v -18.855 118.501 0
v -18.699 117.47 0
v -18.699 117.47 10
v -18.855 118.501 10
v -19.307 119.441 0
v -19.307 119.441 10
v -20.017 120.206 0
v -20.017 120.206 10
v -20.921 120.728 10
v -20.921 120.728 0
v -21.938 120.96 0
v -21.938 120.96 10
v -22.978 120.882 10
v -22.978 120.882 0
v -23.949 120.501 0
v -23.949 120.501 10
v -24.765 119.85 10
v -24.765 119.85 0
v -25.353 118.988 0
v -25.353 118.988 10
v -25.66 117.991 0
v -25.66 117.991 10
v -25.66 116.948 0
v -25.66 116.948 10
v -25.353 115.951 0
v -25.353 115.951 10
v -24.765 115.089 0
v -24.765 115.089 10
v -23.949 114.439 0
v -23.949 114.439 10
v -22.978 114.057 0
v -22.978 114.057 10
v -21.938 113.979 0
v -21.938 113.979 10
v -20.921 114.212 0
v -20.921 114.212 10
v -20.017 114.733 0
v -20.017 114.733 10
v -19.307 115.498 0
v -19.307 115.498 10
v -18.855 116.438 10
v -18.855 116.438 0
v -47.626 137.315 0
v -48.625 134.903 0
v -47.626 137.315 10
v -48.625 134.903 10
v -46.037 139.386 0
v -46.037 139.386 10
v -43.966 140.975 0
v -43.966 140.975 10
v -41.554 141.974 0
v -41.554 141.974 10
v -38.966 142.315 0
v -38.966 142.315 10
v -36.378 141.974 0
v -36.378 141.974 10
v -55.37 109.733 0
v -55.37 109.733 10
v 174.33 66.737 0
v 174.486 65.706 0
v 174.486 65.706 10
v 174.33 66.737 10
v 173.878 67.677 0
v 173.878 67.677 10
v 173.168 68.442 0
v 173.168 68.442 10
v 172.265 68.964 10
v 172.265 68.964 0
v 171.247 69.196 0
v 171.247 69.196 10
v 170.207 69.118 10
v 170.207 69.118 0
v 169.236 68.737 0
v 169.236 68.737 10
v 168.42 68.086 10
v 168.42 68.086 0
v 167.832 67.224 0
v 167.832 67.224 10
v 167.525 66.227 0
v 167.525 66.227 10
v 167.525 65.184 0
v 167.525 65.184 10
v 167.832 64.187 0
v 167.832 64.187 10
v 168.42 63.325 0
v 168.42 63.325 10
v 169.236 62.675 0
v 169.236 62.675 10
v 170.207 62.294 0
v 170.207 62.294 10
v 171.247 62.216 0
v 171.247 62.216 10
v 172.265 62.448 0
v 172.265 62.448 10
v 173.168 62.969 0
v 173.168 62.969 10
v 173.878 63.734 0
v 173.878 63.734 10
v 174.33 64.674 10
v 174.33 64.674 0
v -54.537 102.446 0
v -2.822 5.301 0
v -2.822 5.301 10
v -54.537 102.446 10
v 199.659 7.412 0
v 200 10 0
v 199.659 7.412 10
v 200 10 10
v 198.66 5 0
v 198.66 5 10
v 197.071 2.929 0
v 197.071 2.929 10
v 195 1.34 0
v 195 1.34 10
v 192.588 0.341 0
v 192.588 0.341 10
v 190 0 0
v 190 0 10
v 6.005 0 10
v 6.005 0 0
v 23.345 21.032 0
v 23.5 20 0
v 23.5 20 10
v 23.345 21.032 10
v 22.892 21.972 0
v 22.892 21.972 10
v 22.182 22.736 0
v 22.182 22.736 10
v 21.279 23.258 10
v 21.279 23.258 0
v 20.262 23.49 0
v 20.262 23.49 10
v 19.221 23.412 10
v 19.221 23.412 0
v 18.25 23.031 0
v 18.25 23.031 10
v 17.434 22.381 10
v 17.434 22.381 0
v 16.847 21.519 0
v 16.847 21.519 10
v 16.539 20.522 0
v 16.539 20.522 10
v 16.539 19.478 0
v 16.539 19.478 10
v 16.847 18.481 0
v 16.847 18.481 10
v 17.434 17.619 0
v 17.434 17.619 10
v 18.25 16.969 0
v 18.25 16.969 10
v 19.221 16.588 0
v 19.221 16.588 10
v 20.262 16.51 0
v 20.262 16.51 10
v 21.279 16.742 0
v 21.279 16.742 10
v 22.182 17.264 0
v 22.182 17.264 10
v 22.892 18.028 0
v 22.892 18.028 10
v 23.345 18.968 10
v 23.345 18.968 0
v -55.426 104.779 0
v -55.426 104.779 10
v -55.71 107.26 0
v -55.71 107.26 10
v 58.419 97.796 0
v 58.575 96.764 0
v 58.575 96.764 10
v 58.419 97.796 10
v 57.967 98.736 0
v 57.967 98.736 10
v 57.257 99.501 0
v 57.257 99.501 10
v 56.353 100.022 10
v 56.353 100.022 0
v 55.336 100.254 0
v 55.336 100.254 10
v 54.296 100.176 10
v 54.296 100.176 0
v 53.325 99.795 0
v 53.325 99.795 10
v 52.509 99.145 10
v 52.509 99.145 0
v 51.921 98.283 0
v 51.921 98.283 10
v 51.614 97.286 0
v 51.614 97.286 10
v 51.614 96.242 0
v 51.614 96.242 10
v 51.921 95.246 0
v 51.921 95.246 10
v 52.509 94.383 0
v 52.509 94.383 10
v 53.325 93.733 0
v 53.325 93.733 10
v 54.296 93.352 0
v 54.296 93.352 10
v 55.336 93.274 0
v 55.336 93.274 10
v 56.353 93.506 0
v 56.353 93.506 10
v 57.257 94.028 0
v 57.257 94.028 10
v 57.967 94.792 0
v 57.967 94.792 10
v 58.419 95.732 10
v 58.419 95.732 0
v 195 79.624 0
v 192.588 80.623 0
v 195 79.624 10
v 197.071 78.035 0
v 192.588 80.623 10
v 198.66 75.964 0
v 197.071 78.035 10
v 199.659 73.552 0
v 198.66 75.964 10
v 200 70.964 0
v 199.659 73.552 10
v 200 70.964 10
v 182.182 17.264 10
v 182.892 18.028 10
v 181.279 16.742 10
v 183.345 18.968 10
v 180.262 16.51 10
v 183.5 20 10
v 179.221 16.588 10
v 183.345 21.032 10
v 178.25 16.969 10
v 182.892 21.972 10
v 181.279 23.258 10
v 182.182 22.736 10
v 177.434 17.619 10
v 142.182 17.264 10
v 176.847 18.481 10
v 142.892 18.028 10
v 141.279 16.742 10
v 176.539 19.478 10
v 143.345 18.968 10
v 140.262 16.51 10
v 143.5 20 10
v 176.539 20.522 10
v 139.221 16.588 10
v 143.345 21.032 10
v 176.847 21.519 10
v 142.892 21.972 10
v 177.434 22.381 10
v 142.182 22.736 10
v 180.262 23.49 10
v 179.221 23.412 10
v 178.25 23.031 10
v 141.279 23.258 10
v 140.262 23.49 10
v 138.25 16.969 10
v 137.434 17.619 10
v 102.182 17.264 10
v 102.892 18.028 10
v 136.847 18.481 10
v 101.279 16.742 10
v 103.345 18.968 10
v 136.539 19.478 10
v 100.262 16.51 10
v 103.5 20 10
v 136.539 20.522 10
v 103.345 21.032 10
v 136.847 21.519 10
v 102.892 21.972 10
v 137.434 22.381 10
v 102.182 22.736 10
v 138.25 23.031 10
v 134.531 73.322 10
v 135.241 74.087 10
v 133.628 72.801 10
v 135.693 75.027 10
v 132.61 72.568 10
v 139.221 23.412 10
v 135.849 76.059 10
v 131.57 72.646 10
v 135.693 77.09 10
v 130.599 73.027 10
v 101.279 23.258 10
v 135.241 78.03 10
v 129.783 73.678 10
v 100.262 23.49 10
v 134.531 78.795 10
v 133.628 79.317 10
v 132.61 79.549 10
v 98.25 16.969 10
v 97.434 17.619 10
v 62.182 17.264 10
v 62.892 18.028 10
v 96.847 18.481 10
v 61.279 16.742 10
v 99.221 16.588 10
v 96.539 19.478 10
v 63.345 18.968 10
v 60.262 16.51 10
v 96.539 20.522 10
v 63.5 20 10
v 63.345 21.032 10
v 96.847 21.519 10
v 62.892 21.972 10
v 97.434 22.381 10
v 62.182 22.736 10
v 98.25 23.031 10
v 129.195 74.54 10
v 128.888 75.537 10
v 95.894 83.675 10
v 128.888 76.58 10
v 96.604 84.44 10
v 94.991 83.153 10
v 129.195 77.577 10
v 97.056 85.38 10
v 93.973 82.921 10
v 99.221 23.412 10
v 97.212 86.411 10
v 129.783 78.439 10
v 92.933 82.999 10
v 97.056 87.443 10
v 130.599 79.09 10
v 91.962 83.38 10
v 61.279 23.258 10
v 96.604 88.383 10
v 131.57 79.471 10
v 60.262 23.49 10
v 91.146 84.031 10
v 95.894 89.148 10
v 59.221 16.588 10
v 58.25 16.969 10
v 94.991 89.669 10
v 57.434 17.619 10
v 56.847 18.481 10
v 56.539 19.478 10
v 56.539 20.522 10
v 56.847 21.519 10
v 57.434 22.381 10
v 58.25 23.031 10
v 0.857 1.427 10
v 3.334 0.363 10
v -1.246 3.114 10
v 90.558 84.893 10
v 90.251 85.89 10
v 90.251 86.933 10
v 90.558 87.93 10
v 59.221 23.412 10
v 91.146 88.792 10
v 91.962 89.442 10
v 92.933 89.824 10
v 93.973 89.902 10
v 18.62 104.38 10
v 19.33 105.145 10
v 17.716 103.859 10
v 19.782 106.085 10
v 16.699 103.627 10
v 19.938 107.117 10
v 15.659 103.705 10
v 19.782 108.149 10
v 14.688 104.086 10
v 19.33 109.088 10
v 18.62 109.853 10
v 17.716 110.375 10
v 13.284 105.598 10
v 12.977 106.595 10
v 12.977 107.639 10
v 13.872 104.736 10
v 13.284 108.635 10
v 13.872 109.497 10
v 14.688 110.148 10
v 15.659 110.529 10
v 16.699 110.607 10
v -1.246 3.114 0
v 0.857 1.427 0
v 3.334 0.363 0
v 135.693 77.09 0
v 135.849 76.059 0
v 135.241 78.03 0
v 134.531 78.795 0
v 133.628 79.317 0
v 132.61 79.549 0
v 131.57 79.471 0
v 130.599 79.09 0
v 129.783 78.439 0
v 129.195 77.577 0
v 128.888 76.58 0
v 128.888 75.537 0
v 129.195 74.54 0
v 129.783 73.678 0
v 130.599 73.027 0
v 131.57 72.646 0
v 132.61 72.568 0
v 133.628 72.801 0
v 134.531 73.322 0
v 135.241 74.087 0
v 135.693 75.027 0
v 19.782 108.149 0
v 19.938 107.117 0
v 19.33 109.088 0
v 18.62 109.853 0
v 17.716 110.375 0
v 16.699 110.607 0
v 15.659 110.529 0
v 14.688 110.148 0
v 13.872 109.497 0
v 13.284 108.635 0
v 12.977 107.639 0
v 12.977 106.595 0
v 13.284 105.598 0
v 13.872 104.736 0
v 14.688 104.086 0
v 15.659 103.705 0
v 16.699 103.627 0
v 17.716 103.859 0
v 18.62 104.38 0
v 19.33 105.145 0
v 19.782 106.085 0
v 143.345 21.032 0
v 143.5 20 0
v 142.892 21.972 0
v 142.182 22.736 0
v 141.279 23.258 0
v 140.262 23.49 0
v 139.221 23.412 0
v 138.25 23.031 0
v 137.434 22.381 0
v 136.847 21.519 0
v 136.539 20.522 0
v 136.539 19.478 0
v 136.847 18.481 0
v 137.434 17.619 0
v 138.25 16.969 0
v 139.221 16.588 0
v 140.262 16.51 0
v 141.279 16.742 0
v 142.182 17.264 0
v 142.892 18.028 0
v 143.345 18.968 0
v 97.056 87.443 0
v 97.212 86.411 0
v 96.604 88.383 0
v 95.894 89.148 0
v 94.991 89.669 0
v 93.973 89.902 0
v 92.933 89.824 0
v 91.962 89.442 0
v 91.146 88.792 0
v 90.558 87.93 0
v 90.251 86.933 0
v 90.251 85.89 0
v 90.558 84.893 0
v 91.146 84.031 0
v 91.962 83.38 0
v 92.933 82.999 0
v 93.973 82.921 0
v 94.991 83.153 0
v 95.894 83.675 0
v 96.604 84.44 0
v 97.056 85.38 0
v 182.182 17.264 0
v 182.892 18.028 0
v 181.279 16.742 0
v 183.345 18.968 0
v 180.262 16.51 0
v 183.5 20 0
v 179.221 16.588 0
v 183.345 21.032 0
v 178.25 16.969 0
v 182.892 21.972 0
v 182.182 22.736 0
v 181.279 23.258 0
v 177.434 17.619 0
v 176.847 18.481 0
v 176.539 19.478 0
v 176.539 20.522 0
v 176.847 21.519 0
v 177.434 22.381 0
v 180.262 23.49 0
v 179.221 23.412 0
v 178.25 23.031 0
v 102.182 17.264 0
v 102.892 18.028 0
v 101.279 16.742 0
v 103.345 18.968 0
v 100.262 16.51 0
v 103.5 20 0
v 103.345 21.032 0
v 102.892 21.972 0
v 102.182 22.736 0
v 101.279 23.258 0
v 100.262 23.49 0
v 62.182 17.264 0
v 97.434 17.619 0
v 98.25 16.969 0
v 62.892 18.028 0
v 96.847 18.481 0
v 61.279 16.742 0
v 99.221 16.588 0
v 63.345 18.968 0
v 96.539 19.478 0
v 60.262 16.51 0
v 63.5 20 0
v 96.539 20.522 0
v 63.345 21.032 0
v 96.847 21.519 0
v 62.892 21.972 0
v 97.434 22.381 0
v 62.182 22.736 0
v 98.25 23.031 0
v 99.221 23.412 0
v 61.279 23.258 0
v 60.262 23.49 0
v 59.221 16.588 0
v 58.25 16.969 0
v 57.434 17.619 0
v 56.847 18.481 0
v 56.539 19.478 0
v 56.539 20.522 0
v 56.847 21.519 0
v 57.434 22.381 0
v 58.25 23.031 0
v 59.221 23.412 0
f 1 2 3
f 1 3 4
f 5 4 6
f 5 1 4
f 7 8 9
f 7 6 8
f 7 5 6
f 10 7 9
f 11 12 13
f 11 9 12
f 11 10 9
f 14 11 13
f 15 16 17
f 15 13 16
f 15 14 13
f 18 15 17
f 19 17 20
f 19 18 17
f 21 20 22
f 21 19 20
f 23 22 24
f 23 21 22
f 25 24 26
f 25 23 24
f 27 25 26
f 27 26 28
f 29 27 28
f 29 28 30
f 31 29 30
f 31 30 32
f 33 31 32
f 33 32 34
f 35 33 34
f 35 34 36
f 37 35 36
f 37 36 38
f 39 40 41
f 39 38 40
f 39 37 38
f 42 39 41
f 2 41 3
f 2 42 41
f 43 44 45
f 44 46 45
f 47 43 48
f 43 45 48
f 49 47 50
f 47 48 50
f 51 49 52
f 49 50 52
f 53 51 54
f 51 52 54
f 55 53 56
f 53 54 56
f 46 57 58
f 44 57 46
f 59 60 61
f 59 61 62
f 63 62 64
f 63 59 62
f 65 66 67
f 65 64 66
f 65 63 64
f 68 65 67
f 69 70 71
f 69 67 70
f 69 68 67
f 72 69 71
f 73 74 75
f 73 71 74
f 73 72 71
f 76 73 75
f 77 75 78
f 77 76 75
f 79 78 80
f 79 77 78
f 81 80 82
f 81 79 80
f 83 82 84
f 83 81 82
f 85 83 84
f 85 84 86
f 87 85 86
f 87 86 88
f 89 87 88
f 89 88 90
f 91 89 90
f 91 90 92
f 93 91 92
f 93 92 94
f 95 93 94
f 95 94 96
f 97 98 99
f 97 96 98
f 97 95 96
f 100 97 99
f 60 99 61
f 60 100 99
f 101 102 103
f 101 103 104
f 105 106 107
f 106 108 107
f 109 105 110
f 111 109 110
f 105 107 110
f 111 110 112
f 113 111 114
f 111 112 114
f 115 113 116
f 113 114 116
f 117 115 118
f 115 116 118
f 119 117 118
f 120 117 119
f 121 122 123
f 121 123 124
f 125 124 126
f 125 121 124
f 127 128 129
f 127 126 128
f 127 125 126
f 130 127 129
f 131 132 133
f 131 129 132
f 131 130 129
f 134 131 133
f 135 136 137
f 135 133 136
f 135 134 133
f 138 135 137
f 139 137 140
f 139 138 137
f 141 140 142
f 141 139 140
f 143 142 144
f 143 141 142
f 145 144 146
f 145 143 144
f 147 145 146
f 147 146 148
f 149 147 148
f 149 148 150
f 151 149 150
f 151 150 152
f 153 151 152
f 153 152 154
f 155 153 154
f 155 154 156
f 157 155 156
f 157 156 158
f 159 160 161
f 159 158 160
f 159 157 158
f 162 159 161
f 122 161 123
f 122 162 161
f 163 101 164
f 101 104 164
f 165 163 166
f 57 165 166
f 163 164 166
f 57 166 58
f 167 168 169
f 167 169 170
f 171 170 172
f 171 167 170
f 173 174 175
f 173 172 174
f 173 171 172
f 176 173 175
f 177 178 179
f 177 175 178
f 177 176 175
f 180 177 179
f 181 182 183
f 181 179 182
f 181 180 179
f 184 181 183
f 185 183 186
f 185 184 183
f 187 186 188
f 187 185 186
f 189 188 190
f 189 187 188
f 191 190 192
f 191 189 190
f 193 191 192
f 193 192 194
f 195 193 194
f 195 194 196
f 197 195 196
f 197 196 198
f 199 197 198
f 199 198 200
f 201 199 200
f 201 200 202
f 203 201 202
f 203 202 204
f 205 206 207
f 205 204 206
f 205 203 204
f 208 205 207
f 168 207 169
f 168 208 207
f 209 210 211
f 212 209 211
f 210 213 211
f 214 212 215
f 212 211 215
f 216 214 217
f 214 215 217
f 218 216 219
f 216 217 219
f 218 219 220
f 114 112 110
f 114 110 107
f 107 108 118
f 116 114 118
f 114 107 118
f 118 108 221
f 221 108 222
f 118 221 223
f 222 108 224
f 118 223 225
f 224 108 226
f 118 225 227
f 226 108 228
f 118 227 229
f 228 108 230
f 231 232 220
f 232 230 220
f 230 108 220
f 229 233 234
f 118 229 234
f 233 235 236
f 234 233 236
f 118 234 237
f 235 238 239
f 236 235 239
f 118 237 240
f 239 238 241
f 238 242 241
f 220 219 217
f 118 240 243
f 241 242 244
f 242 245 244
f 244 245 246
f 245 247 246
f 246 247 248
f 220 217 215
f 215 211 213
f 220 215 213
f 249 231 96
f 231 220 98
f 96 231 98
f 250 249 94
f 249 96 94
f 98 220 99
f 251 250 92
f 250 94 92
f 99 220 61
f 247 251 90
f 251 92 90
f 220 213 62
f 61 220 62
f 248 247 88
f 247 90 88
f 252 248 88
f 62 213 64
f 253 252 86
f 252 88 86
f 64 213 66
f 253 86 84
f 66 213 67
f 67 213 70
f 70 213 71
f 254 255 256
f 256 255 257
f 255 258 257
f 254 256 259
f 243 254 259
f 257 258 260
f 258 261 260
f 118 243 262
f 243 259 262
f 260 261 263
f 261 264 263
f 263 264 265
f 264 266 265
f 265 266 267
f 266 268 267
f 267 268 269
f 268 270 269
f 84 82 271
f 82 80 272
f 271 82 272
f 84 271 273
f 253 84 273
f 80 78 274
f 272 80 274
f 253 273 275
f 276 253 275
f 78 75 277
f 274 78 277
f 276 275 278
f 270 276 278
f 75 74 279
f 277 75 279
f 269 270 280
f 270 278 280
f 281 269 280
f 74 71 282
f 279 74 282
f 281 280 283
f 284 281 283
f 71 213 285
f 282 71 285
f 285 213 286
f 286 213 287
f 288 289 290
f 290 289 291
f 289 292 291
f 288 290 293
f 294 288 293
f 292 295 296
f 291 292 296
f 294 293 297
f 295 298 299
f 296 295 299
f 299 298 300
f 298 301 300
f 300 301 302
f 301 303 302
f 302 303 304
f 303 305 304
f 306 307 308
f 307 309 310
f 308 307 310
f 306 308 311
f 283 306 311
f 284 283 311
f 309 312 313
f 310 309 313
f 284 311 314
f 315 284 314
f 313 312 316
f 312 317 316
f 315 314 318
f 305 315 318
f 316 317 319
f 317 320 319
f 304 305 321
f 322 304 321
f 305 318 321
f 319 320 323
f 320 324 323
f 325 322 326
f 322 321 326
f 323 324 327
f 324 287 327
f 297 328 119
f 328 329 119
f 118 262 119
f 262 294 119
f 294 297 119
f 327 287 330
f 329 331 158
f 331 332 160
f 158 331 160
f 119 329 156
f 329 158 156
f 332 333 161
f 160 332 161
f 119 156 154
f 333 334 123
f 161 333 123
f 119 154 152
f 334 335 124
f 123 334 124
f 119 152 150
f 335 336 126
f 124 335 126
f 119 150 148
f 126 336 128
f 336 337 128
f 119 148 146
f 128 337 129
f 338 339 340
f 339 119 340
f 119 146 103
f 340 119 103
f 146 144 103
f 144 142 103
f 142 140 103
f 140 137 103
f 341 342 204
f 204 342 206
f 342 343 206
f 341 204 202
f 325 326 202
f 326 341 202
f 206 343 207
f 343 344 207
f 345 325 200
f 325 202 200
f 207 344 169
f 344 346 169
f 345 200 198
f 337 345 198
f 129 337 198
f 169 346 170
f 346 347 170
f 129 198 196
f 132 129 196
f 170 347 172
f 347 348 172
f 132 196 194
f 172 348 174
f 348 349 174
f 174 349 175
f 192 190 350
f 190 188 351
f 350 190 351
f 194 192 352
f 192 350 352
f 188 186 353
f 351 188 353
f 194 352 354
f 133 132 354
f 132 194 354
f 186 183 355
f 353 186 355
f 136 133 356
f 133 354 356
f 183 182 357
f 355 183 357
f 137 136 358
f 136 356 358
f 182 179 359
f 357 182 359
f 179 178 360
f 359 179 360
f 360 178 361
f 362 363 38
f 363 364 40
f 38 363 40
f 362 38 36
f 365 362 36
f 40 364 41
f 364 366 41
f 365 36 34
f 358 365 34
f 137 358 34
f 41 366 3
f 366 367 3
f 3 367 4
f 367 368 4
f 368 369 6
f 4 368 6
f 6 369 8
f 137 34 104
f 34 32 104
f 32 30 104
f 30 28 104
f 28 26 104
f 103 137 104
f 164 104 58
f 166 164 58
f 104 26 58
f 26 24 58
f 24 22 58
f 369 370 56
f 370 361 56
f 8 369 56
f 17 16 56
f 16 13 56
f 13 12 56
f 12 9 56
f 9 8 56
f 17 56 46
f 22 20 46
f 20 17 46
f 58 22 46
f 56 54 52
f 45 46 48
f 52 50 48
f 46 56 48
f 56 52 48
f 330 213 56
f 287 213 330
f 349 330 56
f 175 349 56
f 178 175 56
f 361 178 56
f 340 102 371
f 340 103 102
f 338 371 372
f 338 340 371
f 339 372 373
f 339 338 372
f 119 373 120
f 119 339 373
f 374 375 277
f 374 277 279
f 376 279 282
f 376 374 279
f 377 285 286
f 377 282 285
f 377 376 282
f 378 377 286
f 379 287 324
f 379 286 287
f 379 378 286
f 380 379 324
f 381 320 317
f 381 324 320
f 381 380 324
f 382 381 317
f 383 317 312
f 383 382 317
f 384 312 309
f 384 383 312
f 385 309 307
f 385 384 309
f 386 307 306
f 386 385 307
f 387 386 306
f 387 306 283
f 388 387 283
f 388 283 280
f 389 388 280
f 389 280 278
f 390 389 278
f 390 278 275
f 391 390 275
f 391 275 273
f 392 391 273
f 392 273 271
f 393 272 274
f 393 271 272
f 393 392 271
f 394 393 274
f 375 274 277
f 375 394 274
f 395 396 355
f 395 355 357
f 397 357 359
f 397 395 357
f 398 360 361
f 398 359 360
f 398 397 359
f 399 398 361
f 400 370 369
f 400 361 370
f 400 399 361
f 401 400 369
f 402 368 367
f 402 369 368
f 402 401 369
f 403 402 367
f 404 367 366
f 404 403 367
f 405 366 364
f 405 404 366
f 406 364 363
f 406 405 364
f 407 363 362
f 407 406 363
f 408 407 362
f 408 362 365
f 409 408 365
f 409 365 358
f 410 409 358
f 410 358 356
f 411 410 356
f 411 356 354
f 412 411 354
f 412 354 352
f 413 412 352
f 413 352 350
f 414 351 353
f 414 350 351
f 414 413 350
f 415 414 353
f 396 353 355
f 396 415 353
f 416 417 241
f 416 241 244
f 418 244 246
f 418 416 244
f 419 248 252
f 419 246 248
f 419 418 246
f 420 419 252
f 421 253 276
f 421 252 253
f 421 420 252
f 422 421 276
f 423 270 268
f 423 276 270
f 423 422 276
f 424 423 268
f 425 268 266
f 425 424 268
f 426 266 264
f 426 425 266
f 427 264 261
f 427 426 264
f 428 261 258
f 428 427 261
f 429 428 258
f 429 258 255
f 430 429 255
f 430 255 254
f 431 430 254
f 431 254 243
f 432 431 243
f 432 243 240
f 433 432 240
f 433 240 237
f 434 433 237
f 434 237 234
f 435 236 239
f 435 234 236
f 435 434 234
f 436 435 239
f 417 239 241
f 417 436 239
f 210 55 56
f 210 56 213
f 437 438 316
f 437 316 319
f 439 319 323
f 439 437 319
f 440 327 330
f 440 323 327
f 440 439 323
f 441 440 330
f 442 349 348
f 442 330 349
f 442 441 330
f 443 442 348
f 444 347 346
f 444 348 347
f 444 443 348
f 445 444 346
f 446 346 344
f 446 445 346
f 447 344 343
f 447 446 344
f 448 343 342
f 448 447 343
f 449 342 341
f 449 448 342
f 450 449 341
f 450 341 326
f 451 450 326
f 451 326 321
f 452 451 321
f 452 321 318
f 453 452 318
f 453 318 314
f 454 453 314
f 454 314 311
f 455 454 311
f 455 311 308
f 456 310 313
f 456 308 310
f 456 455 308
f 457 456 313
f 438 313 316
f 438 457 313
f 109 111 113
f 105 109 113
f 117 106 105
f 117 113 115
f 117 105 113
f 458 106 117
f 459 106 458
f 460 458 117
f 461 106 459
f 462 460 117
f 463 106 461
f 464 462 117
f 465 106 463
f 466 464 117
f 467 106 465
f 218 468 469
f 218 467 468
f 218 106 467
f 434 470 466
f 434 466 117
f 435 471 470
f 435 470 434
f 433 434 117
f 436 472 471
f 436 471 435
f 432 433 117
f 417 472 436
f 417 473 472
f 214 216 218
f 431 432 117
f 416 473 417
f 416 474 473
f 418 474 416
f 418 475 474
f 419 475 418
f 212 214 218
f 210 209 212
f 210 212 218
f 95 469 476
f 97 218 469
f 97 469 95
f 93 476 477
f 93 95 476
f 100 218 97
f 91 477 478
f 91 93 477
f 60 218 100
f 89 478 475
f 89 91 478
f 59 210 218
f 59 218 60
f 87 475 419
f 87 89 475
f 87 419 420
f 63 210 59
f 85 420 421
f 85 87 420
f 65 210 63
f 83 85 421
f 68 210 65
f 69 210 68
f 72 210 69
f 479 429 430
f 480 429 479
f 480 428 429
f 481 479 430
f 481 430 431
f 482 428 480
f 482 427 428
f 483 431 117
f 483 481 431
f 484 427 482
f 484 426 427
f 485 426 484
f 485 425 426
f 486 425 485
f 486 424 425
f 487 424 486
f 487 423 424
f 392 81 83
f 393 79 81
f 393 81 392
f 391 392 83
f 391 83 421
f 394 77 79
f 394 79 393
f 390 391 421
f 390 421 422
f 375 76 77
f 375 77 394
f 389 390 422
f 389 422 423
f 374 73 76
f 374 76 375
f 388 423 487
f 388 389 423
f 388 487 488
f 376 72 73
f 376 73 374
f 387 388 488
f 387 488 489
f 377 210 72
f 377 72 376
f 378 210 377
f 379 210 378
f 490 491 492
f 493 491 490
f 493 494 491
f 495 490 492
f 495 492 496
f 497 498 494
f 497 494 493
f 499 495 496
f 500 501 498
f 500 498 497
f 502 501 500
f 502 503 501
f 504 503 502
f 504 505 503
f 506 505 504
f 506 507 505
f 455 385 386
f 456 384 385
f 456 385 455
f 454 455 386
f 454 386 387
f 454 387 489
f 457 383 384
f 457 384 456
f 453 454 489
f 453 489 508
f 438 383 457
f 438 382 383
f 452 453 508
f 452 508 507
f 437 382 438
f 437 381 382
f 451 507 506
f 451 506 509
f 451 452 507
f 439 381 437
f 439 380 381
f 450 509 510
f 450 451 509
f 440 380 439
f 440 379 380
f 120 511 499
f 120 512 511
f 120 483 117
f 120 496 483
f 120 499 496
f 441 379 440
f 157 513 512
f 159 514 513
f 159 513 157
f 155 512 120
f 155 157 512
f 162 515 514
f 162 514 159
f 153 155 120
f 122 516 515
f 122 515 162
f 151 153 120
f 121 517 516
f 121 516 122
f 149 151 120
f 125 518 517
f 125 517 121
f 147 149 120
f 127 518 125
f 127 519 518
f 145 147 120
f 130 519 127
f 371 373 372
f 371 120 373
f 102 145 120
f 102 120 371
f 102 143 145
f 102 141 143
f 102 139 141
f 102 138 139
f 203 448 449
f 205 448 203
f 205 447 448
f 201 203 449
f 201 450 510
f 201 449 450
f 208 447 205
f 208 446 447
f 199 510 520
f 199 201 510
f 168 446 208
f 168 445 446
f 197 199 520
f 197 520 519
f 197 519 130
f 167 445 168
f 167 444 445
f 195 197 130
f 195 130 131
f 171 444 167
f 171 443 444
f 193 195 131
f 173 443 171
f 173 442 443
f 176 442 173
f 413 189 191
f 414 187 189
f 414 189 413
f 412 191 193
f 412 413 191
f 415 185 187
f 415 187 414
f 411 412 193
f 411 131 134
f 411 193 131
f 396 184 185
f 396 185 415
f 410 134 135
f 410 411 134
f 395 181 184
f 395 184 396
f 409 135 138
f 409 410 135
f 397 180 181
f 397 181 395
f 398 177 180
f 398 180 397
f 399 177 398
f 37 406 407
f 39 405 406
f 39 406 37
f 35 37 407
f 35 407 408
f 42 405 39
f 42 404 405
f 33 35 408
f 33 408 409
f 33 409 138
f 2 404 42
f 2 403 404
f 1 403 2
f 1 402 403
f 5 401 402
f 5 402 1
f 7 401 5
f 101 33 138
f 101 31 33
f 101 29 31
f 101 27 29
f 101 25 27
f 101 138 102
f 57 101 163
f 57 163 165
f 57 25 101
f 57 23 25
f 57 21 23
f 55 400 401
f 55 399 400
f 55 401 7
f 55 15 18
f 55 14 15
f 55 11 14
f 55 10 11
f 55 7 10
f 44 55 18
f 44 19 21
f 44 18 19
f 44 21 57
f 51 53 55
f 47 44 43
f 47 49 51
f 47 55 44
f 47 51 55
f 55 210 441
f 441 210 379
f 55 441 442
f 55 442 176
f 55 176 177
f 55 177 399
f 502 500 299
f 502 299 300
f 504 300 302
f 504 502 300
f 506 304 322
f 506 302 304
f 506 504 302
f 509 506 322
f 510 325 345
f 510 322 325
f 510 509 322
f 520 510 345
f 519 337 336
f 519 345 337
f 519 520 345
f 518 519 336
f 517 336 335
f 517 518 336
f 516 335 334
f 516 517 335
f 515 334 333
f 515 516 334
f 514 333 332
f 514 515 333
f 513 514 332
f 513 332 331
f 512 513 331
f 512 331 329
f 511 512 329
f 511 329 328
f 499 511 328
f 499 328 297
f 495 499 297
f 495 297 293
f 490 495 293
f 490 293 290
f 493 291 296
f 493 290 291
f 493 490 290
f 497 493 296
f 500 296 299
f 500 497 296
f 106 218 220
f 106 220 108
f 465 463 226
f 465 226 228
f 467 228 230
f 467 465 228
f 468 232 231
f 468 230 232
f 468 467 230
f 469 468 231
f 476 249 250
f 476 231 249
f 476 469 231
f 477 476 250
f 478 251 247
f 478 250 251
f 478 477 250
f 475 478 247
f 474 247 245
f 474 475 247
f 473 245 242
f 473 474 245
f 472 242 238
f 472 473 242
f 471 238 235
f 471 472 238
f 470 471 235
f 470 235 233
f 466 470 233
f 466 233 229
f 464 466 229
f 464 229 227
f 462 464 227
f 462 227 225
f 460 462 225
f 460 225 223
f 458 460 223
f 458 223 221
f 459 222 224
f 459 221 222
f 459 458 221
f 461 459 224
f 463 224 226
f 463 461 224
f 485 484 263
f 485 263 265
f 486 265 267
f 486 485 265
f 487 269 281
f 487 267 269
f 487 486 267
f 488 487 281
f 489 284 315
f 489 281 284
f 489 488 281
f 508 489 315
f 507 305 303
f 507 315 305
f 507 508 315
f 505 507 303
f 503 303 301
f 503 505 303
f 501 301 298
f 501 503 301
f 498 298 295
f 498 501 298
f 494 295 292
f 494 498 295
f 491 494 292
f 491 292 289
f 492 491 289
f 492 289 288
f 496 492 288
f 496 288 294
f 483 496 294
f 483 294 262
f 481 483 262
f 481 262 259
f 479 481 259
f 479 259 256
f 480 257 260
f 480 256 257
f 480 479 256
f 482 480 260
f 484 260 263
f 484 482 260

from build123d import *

# Parameters (mm, degrees)
BOSS_EXTRU_1_DEPTH           = 10
CONG_1_R                     = 10
ENL_V_MAT_EXTRU_1_DEPTH      = 246.669614874
ENL_V_MAT_EXTRU_1_DEPTH_BACK = 246.669614874
ESQUISSE2_R                  = 3.5


with BuildPart() as part:
    # Esquisse1 → Boss.-Extru.1 (new body)
    with BuildSketch(Plane.XY):
        Polygon((0, 0), (-56.389768432, 105.925417234), (-46.037006628, 144.562450286), (200, 78.637033052), (200, 0), align=None)
    extrude(amount=BOSS_EXTRU_1_DEPTH)

    # Congé1
    cong_1_edges = [part.edges().sort_by_distance(p)[0] for p in [
        (0, 0, 5),
        (-56.389768432, 105.925417234, 5),
        (-46.037006628, 144.562450286, 5),
        (200, 78.637033052, 5),
        (200, 0, 5),
    ]]
    fillet(cong_1_edges, radius=CONG_1_R)

    # Esquisse2 → Enlèv. mat.-Extru.1 (cut, two sides: drawn at the far end of the back side and taken through both)
    with BuildSketch(Plane.XY.offset(10).offset(-ENL_V_MAT_EXTRU_1_DEPTH_BACK)):
        with Locations((-22.199276394, 117.469626112)):
            Circle(ESQUISSE2_R)
        with Locations((16.437756658, 107.116864308)):
            Circle(ESQUISSE2_R)
        with Locations((55.074789709, 96.764102504)):
            Circle(ESQUISSE2_R)
        with Locations((93.711822761, 86.4113407)):
            Circle(ESQUISSE2_R)
        with Locations((132.348855812, 76.058578895)):
            Circle(ESQUISSE2_R)
        with Locations((170.985888864, 65.705817091)):
            Circle(ESQUISSE2_R)
        with Locations((20, 20)):
            Circle(ESQUISSE2_R)
        with Locations((60, 20)):
            Circle(ESQUISSE2_R)
        with Locations((100, 20)):
            Circle(ESQUISSE2_R)
        with Locations((180, 20)):
            Circle(ESQUISSE2_R)
        with Locations((140, 20)):
            Circle(ESQUISSE2_R)
    extrude(amount=ENL_V_MAT_EXTRU_1_DEPTH + ENL_V_MAT_EXTRU_1_DEPTH_BACK, mode=Mode.SUBTRACT)


solid = part.part
